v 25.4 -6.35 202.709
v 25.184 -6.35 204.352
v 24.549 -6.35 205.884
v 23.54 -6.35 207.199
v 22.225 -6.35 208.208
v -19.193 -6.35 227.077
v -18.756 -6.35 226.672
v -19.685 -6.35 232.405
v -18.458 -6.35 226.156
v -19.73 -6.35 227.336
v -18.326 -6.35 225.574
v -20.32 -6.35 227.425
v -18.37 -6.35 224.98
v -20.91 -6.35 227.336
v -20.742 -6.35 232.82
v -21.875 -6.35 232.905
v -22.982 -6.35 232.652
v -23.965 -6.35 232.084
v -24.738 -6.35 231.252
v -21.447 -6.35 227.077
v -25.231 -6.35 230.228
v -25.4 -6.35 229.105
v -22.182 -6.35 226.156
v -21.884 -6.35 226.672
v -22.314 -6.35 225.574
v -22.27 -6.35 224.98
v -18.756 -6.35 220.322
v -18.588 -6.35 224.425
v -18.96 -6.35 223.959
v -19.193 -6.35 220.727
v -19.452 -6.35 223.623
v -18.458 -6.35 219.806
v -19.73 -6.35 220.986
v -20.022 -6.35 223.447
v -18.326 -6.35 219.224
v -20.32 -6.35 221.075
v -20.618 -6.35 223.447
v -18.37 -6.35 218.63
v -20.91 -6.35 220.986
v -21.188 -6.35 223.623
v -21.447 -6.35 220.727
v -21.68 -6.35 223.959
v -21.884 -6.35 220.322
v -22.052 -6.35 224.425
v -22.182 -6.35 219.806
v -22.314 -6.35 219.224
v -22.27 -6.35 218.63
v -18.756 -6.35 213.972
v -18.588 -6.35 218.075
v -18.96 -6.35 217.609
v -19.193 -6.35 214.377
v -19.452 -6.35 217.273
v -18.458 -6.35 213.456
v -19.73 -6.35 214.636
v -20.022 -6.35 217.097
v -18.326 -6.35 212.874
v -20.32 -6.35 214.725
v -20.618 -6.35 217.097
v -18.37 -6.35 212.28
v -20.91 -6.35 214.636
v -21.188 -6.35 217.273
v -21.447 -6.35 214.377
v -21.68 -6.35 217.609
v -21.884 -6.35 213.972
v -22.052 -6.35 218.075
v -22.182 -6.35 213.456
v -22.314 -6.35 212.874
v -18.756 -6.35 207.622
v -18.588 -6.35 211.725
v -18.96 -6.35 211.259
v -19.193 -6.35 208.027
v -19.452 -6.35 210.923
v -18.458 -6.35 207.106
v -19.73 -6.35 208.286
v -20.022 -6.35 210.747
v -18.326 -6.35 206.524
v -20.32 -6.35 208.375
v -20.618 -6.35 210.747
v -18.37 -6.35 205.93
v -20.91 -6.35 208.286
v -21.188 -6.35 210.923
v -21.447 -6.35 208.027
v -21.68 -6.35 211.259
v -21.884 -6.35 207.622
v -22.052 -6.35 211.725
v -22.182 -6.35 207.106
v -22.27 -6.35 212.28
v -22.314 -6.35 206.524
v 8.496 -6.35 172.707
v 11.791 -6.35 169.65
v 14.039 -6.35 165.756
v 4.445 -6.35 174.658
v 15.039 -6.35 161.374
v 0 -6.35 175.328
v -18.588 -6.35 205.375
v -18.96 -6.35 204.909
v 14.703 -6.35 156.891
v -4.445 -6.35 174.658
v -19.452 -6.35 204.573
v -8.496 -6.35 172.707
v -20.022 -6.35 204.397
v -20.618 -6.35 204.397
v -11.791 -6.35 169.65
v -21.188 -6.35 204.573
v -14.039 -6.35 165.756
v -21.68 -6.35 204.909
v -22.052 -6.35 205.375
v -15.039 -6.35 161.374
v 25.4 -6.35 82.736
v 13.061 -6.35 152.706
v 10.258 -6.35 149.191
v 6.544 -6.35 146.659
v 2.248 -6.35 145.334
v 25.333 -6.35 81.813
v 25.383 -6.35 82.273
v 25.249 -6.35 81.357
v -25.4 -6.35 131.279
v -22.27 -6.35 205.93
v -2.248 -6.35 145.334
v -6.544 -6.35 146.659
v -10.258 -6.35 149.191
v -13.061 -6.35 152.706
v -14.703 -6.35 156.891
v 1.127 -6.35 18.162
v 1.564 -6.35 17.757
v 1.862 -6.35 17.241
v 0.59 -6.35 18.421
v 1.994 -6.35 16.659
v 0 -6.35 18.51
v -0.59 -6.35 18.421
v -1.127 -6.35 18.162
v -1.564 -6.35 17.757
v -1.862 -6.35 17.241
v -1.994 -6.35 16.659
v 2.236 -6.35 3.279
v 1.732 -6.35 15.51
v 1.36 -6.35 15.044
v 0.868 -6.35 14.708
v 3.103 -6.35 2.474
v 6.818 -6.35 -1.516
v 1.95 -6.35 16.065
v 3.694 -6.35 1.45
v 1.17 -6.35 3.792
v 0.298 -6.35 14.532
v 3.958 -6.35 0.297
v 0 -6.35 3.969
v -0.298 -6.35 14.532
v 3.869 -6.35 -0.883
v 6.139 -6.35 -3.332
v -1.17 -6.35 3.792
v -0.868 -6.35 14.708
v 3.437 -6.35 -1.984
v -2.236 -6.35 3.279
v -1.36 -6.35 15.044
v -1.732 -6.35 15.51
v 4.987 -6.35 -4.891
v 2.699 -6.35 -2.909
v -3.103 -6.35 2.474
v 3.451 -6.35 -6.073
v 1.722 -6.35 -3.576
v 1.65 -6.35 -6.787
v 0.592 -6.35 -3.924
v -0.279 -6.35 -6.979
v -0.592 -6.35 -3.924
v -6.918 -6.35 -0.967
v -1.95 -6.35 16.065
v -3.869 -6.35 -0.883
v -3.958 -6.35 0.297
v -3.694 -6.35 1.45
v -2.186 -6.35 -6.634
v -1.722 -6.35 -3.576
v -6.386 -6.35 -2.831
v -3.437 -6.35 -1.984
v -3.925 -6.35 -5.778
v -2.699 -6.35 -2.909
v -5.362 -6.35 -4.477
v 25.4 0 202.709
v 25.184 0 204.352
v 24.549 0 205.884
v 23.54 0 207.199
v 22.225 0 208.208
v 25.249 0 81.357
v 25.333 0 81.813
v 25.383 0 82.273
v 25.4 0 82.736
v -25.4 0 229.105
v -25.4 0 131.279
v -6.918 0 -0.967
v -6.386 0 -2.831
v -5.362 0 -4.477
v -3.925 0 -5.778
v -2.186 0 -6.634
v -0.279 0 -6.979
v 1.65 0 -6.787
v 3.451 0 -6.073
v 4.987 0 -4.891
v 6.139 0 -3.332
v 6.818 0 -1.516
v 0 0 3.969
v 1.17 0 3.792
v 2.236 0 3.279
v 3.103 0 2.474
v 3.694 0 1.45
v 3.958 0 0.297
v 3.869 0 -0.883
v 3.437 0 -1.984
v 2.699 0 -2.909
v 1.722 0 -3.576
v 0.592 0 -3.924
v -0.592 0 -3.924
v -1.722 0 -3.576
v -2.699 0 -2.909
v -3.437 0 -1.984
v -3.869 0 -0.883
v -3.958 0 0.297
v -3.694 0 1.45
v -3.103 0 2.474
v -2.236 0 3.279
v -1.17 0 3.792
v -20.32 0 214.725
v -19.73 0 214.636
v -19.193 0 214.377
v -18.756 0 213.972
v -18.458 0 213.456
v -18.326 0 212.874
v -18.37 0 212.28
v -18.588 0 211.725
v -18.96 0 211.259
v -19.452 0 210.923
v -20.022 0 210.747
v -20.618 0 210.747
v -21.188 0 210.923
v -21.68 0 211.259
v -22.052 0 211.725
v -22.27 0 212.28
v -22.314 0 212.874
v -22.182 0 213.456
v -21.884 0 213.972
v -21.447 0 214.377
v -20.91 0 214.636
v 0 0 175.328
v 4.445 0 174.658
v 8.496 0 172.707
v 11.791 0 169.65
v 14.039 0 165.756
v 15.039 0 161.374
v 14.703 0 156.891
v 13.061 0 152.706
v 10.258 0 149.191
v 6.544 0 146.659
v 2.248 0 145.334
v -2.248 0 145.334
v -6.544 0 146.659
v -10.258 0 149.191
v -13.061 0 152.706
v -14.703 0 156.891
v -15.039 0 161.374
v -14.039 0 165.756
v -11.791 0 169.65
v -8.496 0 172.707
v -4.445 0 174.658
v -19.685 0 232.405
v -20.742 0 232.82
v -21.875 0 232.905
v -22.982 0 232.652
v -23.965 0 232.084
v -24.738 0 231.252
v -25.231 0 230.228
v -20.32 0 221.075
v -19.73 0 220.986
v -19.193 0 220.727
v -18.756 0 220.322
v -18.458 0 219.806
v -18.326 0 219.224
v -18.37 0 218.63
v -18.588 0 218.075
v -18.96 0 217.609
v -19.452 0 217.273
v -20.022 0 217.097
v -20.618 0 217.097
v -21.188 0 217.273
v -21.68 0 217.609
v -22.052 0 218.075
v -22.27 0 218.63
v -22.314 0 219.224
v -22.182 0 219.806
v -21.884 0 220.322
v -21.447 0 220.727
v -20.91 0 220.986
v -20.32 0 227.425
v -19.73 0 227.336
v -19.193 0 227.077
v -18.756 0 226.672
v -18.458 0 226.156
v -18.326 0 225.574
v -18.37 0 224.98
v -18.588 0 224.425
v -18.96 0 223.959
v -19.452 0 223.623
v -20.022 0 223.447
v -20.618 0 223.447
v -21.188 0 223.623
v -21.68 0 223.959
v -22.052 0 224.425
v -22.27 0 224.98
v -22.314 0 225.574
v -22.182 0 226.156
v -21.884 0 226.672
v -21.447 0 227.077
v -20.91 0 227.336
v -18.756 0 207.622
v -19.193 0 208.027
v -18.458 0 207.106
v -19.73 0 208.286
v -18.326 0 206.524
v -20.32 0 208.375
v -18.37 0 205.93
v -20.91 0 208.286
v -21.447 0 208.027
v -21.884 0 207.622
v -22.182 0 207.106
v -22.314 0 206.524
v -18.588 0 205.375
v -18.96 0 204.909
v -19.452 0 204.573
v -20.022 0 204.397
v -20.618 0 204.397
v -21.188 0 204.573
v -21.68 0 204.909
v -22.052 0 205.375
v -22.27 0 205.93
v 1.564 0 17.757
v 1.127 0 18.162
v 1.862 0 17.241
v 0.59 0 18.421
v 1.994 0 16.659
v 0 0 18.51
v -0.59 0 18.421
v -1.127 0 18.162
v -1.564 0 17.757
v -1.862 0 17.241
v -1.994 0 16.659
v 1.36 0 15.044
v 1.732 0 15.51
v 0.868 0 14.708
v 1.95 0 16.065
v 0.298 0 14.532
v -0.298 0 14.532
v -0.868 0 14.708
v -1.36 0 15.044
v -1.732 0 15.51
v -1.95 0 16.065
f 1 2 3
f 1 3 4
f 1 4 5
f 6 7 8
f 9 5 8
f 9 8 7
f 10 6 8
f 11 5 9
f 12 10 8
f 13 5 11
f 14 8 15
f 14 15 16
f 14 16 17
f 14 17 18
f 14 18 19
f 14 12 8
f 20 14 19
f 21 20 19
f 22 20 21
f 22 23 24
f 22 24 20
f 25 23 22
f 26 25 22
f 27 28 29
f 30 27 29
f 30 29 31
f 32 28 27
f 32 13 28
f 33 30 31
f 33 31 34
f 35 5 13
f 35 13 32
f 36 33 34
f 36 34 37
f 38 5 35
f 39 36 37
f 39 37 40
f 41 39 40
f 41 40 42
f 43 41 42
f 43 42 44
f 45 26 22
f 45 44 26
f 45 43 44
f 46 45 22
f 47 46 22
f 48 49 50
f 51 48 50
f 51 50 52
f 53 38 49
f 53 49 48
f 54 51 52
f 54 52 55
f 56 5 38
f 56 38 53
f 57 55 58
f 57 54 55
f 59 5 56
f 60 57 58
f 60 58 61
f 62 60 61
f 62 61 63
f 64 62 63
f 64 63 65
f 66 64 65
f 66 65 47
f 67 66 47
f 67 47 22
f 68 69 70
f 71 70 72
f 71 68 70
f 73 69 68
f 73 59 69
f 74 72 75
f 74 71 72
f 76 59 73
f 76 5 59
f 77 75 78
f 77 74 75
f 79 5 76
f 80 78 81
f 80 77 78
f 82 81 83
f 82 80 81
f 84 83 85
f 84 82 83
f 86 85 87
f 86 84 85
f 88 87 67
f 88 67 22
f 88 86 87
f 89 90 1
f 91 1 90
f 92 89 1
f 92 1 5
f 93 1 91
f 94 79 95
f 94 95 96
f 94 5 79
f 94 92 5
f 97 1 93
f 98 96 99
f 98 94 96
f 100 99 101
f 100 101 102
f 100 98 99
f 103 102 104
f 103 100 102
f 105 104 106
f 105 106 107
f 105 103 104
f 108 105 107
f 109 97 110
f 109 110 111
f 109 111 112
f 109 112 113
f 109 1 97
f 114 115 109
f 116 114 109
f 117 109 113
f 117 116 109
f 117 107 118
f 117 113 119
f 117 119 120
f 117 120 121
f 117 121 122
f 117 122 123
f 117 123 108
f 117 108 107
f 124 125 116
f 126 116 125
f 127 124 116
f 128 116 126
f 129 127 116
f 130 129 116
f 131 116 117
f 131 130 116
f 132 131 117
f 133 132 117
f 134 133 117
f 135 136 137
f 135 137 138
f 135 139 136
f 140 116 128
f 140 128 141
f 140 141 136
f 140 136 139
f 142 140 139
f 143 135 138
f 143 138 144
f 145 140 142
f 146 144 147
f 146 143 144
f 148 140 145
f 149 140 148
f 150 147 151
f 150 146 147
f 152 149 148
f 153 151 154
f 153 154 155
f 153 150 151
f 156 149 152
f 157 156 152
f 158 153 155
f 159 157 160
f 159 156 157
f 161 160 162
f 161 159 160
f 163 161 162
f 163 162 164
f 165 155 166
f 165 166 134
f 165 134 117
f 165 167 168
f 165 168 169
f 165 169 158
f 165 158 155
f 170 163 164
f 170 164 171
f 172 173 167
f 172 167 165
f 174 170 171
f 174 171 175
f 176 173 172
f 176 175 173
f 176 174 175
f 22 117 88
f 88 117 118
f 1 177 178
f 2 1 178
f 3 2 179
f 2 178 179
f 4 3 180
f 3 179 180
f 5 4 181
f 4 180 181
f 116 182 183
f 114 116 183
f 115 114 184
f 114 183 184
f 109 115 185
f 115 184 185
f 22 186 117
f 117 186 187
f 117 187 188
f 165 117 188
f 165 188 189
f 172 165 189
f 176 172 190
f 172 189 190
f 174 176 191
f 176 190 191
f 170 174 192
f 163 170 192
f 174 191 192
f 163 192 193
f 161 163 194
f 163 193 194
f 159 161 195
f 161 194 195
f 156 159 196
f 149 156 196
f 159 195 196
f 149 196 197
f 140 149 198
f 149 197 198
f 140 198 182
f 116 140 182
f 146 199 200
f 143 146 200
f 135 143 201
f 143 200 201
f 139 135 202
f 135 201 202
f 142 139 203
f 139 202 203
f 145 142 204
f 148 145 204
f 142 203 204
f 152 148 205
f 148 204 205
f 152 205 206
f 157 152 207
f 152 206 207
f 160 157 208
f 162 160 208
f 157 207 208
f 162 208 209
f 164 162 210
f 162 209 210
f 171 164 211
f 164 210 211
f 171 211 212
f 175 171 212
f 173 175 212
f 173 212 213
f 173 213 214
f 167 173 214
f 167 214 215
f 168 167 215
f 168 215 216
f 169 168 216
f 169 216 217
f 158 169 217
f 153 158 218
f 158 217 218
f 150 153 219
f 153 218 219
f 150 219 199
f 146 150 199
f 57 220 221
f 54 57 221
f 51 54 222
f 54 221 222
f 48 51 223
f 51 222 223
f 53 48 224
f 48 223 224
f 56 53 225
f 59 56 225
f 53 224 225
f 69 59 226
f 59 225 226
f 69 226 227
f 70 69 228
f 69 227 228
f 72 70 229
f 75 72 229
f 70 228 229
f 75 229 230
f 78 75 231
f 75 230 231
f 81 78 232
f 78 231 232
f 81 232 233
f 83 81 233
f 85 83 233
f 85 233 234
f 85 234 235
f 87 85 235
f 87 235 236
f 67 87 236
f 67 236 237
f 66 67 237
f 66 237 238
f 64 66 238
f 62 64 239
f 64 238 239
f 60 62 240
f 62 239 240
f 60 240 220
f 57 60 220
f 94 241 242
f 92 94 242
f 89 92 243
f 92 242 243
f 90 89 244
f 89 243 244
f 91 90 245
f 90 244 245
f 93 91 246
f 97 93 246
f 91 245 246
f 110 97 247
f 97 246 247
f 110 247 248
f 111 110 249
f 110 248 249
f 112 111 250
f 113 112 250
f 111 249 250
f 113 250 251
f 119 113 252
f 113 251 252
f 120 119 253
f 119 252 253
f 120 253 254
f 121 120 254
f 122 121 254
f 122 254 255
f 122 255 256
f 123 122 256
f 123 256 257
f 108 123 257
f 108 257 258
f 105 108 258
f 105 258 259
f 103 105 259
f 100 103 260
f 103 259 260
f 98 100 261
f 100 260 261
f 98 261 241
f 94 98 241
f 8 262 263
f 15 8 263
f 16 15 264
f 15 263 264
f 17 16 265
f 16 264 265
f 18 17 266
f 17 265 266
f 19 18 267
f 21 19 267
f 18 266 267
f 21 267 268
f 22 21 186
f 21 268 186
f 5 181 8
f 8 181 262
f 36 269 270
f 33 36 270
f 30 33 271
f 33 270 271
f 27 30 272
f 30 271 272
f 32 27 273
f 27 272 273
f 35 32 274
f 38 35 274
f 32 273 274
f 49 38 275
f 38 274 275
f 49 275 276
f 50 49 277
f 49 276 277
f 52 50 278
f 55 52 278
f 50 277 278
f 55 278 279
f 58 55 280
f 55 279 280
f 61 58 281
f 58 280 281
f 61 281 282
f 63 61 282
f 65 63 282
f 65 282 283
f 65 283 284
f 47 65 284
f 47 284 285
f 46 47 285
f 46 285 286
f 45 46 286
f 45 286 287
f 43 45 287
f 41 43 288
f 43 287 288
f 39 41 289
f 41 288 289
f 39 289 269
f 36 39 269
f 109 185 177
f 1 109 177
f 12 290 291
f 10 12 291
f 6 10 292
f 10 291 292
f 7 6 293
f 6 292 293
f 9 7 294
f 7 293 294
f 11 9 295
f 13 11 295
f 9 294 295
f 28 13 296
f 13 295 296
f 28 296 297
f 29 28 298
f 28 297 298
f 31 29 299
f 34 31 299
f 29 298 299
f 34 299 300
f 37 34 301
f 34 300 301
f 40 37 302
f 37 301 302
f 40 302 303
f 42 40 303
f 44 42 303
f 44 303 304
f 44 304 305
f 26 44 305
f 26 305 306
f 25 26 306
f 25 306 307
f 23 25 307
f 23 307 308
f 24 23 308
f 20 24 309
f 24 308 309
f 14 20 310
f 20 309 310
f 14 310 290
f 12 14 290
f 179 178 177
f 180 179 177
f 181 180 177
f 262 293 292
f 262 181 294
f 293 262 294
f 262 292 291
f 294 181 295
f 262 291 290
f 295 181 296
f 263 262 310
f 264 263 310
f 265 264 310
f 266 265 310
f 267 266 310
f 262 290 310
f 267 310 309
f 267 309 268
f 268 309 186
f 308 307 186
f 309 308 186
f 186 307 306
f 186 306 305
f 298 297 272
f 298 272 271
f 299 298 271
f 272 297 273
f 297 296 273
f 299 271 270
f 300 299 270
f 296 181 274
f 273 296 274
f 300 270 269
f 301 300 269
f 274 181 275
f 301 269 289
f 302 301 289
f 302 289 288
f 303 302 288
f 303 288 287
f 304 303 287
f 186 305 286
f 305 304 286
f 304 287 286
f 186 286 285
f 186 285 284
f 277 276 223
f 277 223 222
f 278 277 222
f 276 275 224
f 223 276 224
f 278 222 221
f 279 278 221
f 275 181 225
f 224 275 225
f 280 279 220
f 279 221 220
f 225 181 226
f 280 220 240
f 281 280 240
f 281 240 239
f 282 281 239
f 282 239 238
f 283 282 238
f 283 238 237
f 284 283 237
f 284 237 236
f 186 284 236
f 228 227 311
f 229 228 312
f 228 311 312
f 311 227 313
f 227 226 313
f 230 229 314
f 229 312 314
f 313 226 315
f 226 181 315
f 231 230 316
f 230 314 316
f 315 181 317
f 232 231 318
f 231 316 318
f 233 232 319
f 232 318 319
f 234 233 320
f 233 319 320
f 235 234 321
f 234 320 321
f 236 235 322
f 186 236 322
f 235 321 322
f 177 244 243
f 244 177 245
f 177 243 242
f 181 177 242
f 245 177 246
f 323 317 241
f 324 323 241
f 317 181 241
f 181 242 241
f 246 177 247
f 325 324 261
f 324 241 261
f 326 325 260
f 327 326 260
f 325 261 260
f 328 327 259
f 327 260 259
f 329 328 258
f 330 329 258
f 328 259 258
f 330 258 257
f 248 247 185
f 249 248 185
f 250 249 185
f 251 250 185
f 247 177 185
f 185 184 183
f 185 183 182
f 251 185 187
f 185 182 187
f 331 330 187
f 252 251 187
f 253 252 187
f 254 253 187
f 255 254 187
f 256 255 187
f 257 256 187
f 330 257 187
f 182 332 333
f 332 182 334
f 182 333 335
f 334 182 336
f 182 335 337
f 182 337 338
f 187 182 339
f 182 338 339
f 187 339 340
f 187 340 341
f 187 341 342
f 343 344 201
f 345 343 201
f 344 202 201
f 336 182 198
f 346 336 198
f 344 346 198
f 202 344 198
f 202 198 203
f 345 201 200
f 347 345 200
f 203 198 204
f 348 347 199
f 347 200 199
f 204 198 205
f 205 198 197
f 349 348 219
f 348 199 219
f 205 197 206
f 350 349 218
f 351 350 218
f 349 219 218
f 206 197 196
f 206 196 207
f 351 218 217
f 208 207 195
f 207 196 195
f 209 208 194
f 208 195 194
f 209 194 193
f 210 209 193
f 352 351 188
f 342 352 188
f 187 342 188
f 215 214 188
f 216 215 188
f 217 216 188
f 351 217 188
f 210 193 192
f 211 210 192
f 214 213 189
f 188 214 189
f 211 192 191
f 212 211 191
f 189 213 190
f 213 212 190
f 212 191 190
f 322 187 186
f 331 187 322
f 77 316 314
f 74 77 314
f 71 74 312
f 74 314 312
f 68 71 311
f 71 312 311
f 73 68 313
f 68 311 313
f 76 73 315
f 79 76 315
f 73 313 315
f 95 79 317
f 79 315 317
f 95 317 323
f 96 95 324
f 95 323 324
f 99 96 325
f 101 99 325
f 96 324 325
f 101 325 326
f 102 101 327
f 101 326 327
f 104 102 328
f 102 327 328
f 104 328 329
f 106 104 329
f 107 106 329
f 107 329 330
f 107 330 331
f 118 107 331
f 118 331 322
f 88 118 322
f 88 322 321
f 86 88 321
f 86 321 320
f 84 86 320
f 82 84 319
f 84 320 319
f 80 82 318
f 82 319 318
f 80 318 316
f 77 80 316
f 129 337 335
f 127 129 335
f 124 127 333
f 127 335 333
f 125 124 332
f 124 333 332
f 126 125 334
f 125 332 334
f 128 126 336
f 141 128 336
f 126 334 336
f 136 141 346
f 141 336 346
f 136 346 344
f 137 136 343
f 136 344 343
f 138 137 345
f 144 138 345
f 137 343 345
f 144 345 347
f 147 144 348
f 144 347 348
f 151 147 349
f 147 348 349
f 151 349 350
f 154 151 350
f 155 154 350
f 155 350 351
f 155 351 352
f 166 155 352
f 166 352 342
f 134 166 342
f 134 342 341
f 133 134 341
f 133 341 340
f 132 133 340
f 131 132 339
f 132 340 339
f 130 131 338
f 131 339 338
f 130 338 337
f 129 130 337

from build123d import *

# Parameters (mm, degrees)
SKETCH1_R           = 3.96875
SKETCH1_R_2         = 15.08125
SKETCH1_R_3         = 2
BOSS_EXTRUDE1_DEPTH = 6.35


with BuildPart() as part:
    # Sketch1 → Boss-Extrude1 (new body)
    with BuildSketch(Plane(origin=(0, 0, 0), x_dir=(1, 0, 0), z_dir=(0, 1, 0))):
        with BuildLine():
            Line((25.4, -82.735721877), (25.4, -202.708825791))
            ThreePointArc((25.4, -202.708825791), (24.549261314, -205.883825791), (22.225, -208.208087105))
            Line((22.225, -208.208087105), (-19.685, -232.404836886))
            ThreePointArc((-19.685, -232.404836886), (-23.495, -232.404836886), (-25.4, -229.105280098))
            Line((-25.4, -229.105280098), (-25.4, -131.278691098))
            Line((-25.4, -131.278691098), (-6.917767735, 0.966806375))
            ThreePointArc((-6.917767735, 0.966806375), (-0.279220673, 6.97941694), (6.818426198, 1.51634072))
            Line((6.818426198, 1.51634072), (25.248569271, -81.357230313))
            ThreePointArc((25.248569271, -81.357230313), (25.362028789, -82.042329806), (25.4, -82.735721877))
        make_face()
        with Locations(Location((0, 0, 0), (0, 0, 270))):
            Circle(SKETCH1_R, mode=Mode.SUBTRACT)
        with Locations(Location((0, -160.246508934, 0), (0, 0, 270))):
            Circle(SKETCH1_R_2, mode=Mode.SUBTRACT)
        with Locations(Location((-20.32, -225.425, 0), (0, 0, 270))):
            Circle(SKETCH1_R_3, mode=Mode.SUBTRACT)
        with Locations(Location((-20.32, -219.075, 0), (0, 0, 270))):
            Circle(SKETCH1_R_3, mode=Mode.SUBTRACT)
        with Locations(Location((-20.32, -212.725, 0), (0, 0, 270))):
            Circle(SKETCH1_R_3, mode=Mode.SUBTRACT)
        with Locations(Location((-20.32, -206.375, 0), (0, 0, 270))):
            Circle(SKETCH1_R_3, mode=Mode.SUBTRACT)
        with Locations(Location((0, -16.51, 0), (0, 0, 270))):
            Circle(SKETCH1_R_3, mode=Mode.SUBTRACT)
    extrude(amount=-BOSS_EXTRUDE1_DEPTH)


solid = part.part
